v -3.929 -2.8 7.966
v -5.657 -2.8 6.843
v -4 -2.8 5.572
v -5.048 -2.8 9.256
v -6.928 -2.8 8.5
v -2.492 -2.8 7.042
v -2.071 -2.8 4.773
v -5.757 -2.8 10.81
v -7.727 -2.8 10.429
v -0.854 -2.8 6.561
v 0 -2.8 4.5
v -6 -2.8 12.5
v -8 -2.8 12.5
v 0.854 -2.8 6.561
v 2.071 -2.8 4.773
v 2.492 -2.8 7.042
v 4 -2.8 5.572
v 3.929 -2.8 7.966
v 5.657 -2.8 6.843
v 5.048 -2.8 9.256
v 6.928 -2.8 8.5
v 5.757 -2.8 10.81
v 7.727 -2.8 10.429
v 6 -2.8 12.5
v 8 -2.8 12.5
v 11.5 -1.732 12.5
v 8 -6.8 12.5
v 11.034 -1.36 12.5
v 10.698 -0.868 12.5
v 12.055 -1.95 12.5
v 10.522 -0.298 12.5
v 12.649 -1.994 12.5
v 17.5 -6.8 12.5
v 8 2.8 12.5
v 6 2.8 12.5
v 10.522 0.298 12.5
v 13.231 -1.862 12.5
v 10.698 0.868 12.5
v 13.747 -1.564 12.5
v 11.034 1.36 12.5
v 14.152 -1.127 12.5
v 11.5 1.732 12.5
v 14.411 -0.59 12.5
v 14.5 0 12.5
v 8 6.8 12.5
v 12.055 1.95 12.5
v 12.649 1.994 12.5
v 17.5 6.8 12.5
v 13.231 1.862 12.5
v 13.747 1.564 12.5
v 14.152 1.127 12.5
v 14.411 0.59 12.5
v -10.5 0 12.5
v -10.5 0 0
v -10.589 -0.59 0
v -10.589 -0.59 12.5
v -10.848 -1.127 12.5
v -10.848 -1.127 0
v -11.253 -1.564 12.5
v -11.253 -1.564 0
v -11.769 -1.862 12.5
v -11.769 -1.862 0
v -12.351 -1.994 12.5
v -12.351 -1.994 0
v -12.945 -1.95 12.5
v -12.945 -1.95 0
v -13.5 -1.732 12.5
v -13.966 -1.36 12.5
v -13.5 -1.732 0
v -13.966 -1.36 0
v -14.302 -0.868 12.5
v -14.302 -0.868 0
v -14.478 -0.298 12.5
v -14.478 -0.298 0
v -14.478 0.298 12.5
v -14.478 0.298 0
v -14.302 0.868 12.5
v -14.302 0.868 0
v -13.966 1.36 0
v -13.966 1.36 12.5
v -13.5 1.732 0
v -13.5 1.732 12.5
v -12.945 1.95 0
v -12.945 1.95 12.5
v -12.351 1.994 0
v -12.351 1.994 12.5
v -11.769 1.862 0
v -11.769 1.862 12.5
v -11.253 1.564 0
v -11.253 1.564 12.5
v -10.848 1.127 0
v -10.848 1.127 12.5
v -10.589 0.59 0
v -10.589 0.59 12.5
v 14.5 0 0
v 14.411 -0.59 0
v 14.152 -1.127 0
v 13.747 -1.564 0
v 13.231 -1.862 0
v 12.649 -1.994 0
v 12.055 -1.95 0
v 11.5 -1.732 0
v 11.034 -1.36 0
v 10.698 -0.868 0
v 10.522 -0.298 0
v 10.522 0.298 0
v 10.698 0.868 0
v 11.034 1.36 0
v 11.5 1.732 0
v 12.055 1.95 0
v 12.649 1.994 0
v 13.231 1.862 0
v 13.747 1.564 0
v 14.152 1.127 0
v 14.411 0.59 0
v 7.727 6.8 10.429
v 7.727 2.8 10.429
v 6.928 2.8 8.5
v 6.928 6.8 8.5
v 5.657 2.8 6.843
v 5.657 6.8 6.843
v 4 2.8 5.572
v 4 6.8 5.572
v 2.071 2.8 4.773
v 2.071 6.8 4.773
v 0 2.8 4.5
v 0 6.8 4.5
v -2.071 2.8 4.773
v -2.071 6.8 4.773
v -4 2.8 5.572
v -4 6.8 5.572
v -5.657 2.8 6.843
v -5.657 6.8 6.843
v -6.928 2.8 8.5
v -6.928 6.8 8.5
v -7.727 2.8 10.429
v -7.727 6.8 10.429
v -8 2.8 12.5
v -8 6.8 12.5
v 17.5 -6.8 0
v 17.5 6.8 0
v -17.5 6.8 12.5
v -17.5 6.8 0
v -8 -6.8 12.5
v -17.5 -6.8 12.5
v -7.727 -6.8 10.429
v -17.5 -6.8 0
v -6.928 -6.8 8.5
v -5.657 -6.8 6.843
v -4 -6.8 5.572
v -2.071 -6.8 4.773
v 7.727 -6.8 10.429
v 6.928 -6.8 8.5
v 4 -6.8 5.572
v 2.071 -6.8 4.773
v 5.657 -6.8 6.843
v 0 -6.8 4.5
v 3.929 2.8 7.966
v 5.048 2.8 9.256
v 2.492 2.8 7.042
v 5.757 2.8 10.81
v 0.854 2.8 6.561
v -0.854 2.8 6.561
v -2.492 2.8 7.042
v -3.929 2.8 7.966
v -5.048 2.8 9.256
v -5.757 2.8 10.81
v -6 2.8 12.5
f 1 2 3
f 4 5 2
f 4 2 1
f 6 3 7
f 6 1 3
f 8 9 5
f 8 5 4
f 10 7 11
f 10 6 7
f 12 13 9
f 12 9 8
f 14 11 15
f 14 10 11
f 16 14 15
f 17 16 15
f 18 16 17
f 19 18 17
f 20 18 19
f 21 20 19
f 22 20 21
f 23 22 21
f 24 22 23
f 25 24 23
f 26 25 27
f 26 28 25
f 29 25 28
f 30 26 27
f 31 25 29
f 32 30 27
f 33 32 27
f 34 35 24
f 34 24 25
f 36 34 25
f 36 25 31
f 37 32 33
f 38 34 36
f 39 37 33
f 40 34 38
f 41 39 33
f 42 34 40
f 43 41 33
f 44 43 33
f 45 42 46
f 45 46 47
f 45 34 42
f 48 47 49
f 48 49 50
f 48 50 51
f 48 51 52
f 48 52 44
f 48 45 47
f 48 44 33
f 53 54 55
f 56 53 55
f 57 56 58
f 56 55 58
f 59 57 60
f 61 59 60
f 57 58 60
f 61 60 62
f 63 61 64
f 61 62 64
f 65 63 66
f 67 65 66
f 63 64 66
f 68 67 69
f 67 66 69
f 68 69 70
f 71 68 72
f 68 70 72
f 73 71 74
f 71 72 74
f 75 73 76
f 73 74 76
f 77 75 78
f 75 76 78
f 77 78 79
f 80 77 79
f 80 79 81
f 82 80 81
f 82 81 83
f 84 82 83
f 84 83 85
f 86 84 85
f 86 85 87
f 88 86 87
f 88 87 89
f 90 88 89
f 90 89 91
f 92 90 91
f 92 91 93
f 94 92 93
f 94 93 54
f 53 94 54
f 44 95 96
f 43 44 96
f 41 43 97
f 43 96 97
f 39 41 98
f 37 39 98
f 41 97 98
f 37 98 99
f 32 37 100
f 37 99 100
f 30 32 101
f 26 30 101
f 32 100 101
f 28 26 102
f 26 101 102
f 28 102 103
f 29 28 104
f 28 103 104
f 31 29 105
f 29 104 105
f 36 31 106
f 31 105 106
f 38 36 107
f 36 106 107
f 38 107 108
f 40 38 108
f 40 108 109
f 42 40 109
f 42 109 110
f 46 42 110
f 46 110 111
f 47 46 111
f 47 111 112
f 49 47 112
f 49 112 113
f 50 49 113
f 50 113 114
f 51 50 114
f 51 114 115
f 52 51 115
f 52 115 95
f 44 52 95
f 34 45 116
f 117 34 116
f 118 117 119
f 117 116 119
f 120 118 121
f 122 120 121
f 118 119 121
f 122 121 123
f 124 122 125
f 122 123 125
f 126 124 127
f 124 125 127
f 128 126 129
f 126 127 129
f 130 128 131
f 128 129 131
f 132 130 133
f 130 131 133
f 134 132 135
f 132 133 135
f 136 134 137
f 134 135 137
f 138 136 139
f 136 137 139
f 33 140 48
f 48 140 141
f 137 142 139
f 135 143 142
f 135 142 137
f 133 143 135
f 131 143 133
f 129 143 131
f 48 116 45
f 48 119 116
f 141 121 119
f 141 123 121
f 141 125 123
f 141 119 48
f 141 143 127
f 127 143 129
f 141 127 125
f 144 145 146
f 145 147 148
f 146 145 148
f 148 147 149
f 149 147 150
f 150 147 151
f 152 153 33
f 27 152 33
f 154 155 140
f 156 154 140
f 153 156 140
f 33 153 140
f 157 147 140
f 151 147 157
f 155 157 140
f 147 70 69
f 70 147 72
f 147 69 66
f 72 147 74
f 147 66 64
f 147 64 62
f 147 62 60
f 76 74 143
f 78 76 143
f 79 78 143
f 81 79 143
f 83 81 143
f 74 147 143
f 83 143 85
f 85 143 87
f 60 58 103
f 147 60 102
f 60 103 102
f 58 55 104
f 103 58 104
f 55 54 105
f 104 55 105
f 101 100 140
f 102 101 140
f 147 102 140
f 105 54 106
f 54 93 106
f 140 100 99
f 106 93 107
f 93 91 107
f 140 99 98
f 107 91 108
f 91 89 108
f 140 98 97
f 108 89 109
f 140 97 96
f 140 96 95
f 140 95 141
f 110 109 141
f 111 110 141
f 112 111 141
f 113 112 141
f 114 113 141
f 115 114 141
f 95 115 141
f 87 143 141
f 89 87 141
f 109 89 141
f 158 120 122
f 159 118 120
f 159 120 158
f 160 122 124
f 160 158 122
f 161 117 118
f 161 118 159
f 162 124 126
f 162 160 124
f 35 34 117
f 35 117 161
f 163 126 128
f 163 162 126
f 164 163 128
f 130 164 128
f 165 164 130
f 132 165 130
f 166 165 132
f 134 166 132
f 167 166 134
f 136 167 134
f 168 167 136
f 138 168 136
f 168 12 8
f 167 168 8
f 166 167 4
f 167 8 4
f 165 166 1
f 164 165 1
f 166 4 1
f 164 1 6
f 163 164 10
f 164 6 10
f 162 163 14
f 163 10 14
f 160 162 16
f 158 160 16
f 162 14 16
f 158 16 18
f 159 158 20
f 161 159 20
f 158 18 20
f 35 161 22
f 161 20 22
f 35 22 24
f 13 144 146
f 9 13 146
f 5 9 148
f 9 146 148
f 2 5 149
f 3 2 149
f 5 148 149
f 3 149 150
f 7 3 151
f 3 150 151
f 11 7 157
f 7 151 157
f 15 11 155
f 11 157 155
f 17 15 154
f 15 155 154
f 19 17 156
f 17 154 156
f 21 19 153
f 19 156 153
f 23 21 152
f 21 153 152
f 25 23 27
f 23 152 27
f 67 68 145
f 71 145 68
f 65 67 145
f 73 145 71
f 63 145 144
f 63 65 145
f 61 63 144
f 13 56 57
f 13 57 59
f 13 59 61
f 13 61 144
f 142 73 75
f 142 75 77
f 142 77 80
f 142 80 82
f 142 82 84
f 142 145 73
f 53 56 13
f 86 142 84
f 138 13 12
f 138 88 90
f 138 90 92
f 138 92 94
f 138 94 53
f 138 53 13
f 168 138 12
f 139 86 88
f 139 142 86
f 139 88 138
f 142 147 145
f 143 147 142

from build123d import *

# Parameters (mm, degrees)
SKETCH_W        = 35
SKETCH_H        = 13.6
PAD_DEPTH       = 12.5
SKETCH001_R     = 6
POCKET_DEPTH    = 13.601
SKETCH002_R     = 2
POCKET001_DEPTH = 12.501
SKETCH003_R     = 8
POCKET002_DEPTH = 4
SKETCH004_R     = 8
POCKET003_DEPTH = 4


with BuildPart() as part:
    # Sketch → Pad (new body)
    with BuildSketch(Plane.XY):
        Rectangle(SKETCH_W, SKETCH_H)
    extrude(amount=PAD_DEPTH)

    # Sketch001 (on Face3 of Pad) → Pocket (cut, through all)
    with BuildSketch(Plane.XZ.offset(6.8)):
        with Locations((0, 12.5)):
            Circle(SKETCH001_R)
    extrude(amount=-POCKET_DEPTH, mode=Mode.SUBTRACT)

    # Sketch002 (on Face2 of Pocket) → Pocket001 (cut, through all)
    with BuildSketch(Plane(origin=(0, 0, 0), x_dir=(1, 0, 0), z_dir=(0, 0, -1))):
        with Locations((-12.5, 0)):
            Circle(SKETCH002_R)
        with Locations((12.5, 0)):
            Circle(SKETCH002_R)
    extrude(amount=-POCKET001_DEPTH, mode=Mode.SUBTRACT)

    # Sketch003 (on Face8 of Pocket001) → Pocket002 (cut)
    with BuildSketch(Plane.XZ.offset(6.8)):
        with Locations((0, 12.5)):
            Circle(SKETCH003_R)
    extrude(amount=-POCKET002_DEPTH, mode=Mode.SUBTRACT)

    # Sketch004 (on Face1 of Pocket002) → Pocket003 (cut)
    with BuildSketch(Plane(origin=(0, 6.8, 0), x_dir=(-1, 0, 0), z_dir=(0, 1, 0))):
        with Locations((0, 12.5)):
            Circle(SKETCH004_R)
    extrude(amount=-POCKET003_DEPTH, mode=Mode.SUBTRACT)


solid = part.part
